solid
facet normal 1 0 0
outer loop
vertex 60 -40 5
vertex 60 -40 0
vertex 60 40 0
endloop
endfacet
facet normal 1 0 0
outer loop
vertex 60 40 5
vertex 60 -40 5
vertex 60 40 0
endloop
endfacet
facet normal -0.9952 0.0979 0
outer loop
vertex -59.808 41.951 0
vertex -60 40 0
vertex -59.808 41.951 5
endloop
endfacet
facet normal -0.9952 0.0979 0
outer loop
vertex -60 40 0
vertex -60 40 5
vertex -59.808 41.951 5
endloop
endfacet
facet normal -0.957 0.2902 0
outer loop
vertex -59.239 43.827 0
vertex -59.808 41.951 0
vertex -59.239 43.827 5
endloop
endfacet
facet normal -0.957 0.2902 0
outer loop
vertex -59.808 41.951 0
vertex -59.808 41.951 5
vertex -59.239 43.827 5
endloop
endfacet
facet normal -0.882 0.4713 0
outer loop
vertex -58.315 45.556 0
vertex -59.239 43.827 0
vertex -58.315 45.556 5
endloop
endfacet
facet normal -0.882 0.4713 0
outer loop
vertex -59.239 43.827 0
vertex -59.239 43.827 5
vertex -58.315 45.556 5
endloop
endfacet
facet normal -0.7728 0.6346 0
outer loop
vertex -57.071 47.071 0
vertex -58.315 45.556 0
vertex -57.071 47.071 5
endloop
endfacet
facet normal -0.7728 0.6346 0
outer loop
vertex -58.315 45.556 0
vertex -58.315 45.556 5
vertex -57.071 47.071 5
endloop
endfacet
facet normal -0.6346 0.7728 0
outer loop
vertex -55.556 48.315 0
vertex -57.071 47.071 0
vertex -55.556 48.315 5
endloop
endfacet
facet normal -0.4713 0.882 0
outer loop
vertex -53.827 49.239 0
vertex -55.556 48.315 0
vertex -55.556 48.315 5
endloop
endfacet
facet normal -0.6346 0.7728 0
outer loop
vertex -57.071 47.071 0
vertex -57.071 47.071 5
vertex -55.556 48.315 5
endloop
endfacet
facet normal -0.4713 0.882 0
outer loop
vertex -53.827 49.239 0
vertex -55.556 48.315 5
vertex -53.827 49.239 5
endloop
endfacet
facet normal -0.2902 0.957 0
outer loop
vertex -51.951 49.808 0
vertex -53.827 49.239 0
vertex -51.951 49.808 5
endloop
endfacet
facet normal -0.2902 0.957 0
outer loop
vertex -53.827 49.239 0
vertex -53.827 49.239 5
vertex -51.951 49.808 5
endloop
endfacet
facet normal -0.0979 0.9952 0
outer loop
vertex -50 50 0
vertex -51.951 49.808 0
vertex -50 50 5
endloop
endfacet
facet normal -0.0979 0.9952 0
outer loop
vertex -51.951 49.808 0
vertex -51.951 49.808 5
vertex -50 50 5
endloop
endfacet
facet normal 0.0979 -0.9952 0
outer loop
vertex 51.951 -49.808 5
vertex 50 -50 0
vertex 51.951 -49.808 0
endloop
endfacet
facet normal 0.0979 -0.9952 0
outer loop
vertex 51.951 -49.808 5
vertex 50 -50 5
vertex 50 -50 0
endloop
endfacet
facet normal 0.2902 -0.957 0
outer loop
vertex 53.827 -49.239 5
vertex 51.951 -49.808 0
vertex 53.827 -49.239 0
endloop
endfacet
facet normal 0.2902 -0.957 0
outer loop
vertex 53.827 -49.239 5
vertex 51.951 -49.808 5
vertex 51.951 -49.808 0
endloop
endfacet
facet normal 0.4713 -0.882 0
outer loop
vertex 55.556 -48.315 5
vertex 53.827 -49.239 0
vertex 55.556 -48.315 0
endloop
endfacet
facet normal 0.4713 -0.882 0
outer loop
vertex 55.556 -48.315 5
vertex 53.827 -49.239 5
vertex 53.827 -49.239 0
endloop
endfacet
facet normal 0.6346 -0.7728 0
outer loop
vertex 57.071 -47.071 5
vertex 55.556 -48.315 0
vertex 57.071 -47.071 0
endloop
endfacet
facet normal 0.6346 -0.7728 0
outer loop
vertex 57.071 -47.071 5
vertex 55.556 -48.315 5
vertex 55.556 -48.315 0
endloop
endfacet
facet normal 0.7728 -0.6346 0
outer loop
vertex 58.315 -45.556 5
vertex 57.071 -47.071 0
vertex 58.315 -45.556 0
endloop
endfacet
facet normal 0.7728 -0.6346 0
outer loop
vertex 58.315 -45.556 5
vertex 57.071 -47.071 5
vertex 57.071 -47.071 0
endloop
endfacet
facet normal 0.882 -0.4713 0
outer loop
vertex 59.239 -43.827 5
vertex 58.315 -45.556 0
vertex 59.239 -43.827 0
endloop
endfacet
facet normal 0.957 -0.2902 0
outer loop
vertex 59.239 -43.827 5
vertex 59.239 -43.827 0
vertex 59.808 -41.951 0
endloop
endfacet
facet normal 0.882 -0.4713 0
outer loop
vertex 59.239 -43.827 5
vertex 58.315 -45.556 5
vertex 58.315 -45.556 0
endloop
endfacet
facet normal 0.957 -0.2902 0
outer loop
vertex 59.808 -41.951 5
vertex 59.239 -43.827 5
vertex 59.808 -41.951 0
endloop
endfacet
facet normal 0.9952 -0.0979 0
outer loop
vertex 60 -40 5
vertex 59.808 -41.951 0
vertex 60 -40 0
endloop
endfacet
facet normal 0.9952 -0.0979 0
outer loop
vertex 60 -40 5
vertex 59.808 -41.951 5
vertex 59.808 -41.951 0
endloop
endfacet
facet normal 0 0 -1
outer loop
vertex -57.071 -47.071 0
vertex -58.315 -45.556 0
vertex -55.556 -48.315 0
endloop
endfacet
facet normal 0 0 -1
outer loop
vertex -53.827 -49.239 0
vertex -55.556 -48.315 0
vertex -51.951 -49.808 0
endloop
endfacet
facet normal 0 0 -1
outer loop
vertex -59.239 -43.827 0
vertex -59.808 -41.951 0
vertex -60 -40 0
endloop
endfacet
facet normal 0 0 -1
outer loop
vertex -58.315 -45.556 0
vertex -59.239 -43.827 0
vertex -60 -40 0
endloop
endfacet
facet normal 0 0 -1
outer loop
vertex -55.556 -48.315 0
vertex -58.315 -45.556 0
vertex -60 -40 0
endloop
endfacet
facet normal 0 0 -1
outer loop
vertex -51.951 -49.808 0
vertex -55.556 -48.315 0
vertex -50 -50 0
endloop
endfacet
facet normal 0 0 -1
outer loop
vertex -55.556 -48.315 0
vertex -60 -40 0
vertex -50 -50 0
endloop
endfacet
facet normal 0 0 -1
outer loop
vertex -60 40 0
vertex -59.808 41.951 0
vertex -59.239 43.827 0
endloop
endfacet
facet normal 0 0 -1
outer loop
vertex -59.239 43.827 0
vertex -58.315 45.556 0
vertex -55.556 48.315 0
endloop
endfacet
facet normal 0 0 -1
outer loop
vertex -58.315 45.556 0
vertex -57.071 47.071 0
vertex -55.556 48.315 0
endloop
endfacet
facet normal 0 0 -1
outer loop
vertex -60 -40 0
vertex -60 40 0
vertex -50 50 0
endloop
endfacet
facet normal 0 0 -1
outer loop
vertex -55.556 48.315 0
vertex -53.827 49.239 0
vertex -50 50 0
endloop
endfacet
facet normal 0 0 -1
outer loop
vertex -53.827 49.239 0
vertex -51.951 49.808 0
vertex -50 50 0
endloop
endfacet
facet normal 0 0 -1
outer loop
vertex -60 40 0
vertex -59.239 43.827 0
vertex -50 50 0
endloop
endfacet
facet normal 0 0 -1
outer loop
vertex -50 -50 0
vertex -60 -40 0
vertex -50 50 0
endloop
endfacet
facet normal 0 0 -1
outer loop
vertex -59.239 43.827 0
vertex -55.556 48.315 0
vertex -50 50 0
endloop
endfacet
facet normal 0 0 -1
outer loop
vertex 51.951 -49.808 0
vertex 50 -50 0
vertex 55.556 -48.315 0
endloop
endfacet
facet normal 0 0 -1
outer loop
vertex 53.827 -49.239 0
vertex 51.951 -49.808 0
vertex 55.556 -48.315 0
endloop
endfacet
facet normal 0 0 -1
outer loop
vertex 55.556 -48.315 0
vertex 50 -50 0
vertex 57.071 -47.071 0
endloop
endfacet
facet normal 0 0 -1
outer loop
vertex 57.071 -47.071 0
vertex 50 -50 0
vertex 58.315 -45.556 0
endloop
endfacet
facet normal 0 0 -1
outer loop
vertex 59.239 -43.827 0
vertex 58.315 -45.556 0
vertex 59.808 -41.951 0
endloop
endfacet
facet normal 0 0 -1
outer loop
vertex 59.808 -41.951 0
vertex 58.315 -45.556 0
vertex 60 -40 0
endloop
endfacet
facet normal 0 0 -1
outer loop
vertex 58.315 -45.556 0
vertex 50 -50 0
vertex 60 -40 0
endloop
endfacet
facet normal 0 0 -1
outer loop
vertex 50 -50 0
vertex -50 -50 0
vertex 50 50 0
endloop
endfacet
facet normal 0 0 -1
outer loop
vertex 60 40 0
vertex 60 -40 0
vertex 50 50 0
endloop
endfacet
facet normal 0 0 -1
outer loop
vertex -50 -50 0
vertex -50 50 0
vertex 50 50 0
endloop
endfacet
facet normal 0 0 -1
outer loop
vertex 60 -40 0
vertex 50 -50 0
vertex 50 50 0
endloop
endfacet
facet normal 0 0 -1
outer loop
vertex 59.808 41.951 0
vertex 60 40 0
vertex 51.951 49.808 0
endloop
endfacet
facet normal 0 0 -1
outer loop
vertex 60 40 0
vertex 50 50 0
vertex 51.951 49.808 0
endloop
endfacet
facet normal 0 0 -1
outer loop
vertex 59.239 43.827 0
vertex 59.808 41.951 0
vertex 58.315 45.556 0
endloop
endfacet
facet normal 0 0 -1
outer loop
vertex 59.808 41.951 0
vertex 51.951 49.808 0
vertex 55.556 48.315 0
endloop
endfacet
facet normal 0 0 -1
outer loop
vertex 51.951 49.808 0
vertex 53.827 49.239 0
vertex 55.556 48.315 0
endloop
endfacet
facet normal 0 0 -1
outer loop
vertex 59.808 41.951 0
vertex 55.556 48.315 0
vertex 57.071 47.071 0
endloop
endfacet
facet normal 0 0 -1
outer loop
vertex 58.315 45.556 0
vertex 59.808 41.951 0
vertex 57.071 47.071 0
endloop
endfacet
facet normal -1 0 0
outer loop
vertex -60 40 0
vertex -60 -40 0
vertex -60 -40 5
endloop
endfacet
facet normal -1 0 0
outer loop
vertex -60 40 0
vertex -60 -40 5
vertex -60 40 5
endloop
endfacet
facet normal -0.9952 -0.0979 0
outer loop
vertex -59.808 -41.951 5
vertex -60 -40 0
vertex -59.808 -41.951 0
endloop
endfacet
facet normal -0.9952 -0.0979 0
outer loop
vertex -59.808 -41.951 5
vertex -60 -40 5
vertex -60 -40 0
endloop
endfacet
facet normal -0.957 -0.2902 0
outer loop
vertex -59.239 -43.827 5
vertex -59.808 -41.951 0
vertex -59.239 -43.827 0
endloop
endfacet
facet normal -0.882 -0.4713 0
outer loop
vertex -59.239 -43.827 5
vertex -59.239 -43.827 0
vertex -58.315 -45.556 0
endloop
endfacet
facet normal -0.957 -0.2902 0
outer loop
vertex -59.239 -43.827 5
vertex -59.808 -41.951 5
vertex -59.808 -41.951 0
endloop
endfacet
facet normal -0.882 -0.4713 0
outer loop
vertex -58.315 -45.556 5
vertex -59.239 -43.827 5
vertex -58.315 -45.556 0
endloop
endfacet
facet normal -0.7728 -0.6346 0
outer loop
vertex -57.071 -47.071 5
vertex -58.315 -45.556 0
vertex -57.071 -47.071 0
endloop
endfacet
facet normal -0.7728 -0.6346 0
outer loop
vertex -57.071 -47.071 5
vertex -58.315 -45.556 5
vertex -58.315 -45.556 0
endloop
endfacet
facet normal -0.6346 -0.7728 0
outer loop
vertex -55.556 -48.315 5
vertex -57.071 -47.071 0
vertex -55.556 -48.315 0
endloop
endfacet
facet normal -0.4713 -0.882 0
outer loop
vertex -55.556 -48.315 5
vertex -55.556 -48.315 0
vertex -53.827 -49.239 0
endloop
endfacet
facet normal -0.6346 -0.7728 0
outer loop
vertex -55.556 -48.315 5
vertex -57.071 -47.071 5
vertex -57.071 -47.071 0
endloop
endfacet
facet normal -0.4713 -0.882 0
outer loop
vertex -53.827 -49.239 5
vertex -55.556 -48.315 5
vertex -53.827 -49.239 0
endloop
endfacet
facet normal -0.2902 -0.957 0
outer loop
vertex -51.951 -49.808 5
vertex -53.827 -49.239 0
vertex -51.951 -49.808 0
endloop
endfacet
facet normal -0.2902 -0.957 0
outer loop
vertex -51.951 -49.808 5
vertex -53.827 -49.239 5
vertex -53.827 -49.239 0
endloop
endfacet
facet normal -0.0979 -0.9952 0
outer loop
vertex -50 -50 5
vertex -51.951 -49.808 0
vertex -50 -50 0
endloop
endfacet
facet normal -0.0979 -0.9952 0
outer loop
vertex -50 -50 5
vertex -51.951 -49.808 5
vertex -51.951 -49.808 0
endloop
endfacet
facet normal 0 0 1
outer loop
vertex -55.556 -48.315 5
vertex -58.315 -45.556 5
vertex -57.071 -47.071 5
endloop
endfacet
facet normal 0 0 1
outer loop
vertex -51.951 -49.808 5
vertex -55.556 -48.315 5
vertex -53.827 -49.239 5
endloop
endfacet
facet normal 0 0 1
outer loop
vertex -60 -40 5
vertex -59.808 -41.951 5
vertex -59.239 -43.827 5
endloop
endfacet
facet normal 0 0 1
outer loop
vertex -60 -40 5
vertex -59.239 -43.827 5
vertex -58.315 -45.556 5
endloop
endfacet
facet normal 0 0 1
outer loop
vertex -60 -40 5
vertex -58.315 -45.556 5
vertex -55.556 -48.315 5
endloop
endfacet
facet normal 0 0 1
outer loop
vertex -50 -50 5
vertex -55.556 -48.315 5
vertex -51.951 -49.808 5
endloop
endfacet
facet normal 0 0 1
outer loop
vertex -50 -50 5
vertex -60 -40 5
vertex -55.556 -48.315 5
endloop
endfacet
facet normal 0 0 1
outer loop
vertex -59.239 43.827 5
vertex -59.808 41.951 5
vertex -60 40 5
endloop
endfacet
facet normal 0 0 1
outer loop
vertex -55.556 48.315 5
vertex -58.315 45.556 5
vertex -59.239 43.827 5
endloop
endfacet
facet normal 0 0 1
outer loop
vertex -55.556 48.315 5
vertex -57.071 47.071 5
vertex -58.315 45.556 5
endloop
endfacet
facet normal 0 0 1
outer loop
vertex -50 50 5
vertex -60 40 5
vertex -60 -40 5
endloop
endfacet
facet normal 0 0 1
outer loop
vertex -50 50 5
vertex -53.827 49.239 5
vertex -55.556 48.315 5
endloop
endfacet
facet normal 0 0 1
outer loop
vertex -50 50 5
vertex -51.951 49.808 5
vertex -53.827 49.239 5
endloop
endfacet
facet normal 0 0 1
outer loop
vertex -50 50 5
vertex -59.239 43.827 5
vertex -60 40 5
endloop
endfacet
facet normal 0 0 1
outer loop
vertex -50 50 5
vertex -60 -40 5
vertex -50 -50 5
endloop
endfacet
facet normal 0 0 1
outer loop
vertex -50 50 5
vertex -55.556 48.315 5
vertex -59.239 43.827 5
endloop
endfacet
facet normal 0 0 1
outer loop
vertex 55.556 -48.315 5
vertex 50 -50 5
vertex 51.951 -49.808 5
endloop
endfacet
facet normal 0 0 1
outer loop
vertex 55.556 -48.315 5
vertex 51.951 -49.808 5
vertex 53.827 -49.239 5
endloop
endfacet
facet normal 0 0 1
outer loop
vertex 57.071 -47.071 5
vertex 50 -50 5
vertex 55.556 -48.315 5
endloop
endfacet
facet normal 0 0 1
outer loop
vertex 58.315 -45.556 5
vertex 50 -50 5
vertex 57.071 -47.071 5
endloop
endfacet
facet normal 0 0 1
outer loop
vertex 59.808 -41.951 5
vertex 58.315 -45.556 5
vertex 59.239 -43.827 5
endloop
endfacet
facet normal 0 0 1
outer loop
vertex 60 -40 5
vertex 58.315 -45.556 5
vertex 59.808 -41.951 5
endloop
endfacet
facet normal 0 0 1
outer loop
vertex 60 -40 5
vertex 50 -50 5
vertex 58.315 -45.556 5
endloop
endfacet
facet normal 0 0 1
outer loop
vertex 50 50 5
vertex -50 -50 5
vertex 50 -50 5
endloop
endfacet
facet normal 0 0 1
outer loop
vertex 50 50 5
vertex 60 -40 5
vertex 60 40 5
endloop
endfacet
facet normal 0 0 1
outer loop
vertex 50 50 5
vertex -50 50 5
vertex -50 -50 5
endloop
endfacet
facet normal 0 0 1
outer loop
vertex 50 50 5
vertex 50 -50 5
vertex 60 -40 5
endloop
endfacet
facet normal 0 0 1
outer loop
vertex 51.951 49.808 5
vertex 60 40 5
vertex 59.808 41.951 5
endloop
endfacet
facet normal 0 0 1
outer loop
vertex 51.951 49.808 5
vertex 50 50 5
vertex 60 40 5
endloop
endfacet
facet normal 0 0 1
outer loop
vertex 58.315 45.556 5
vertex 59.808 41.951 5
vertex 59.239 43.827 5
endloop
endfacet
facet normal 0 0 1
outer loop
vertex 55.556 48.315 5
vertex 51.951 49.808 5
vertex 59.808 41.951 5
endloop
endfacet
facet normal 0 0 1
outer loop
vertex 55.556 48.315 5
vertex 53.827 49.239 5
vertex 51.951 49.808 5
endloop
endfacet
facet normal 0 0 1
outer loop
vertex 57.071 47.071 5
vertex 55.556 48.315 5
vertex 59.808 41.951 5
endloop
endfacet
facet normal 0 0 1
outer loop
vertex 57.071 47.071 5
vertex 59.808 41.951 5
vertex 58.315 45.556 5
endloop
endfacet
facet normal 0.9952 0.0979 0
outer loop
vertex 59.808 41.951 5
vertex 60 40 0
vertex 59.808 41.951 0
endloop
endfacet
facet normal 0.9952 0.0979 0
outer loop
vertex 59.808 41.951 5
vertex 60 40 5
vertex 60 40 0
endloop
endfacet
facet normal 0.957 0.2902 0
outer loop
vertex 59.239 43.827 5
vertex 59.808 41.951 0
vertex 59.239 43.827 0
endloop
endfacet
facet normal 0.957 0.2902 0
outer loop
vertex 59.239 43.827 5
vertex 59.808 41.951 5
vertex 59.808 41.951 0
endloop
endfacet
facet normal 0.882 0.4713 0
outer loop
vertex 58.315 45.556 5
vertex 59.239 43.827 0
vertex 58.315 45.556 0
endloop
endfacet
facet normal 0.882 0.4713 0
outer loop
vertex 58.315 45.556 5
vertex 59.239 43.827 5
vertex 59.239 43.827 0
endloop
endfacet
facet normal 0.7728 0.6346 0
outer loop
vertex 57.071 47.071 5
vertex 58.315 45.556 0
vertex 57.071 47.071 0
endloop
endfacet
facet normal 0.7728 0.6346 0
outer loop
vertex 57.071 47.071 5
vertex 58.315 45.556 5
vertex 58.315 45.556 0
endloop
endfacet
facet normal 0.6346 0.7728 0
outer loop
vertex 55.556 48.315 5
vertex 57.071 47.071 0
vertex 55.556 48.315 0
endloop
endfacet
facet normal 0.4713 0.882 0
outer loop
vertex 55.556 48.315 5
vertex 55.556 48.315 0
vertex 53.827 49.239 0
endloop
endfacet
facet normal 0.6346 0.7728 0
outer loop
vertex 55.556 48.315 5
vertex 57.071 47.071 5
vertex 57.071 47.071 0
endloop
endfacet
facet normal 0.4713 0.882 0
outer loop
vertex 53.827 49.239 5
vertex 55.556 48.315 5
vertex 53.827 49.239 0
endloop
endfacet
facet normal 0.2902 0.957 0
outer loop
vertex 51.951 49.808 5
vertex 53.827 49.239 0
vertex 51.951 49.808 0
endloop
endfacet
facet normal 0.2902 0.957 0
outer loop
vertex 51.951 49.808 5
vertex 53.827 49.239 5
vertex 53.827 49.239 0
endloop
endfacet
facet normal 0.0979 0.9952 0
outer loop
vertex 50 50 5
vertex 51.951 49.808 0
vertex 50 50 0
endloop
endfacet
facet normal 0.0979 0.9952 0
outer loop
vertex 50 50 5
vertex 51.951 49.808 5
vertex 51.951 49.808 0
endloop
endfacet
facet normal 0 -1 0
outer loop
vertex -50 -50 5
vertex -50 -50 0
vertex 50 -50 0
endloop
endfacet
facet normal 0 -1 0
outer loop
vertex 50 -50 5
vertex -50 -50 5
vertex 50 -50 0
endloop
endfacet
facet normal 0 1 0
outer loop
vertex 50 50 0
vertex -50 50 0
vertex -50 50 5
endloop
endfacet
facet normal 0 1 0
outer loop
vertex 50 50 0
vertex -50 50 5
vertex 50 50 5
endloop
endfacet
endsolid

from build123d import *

# Parameters (mm, degrees)
SZKIC1_W                    = 120
SZKIC1_H                    = 100
DODANIE_WYCI_GNI_CIE1_DEPTH = 5
ZAOKR_GLENIE1_R             = 10


with BuildPart() as part:
    # Szkic1 → Dodanie-wyciągnięcie1 (new body)
    with BuildSketch(Plane.XY):
        Rectangle(SZKIC1_W, SZKIC1_H)
    extrude(amount=DODANIE_WYCI_GNI_CIE1_DEPTH)

    # Zaokrąglenie1
    zaokr_glenie1_edges = [part.edges().sort_by_distance(p)[0] for p in [
        (-60, -50, 2.5),
        (60, -50, 2.5),
        (60, 50, 2.5),
        (-60, 50, 2.5),
    ]]
    fillet(zaokr_glenie1_edges, radius=ZAOKR_GLENIE1_R)


solid = part.part
